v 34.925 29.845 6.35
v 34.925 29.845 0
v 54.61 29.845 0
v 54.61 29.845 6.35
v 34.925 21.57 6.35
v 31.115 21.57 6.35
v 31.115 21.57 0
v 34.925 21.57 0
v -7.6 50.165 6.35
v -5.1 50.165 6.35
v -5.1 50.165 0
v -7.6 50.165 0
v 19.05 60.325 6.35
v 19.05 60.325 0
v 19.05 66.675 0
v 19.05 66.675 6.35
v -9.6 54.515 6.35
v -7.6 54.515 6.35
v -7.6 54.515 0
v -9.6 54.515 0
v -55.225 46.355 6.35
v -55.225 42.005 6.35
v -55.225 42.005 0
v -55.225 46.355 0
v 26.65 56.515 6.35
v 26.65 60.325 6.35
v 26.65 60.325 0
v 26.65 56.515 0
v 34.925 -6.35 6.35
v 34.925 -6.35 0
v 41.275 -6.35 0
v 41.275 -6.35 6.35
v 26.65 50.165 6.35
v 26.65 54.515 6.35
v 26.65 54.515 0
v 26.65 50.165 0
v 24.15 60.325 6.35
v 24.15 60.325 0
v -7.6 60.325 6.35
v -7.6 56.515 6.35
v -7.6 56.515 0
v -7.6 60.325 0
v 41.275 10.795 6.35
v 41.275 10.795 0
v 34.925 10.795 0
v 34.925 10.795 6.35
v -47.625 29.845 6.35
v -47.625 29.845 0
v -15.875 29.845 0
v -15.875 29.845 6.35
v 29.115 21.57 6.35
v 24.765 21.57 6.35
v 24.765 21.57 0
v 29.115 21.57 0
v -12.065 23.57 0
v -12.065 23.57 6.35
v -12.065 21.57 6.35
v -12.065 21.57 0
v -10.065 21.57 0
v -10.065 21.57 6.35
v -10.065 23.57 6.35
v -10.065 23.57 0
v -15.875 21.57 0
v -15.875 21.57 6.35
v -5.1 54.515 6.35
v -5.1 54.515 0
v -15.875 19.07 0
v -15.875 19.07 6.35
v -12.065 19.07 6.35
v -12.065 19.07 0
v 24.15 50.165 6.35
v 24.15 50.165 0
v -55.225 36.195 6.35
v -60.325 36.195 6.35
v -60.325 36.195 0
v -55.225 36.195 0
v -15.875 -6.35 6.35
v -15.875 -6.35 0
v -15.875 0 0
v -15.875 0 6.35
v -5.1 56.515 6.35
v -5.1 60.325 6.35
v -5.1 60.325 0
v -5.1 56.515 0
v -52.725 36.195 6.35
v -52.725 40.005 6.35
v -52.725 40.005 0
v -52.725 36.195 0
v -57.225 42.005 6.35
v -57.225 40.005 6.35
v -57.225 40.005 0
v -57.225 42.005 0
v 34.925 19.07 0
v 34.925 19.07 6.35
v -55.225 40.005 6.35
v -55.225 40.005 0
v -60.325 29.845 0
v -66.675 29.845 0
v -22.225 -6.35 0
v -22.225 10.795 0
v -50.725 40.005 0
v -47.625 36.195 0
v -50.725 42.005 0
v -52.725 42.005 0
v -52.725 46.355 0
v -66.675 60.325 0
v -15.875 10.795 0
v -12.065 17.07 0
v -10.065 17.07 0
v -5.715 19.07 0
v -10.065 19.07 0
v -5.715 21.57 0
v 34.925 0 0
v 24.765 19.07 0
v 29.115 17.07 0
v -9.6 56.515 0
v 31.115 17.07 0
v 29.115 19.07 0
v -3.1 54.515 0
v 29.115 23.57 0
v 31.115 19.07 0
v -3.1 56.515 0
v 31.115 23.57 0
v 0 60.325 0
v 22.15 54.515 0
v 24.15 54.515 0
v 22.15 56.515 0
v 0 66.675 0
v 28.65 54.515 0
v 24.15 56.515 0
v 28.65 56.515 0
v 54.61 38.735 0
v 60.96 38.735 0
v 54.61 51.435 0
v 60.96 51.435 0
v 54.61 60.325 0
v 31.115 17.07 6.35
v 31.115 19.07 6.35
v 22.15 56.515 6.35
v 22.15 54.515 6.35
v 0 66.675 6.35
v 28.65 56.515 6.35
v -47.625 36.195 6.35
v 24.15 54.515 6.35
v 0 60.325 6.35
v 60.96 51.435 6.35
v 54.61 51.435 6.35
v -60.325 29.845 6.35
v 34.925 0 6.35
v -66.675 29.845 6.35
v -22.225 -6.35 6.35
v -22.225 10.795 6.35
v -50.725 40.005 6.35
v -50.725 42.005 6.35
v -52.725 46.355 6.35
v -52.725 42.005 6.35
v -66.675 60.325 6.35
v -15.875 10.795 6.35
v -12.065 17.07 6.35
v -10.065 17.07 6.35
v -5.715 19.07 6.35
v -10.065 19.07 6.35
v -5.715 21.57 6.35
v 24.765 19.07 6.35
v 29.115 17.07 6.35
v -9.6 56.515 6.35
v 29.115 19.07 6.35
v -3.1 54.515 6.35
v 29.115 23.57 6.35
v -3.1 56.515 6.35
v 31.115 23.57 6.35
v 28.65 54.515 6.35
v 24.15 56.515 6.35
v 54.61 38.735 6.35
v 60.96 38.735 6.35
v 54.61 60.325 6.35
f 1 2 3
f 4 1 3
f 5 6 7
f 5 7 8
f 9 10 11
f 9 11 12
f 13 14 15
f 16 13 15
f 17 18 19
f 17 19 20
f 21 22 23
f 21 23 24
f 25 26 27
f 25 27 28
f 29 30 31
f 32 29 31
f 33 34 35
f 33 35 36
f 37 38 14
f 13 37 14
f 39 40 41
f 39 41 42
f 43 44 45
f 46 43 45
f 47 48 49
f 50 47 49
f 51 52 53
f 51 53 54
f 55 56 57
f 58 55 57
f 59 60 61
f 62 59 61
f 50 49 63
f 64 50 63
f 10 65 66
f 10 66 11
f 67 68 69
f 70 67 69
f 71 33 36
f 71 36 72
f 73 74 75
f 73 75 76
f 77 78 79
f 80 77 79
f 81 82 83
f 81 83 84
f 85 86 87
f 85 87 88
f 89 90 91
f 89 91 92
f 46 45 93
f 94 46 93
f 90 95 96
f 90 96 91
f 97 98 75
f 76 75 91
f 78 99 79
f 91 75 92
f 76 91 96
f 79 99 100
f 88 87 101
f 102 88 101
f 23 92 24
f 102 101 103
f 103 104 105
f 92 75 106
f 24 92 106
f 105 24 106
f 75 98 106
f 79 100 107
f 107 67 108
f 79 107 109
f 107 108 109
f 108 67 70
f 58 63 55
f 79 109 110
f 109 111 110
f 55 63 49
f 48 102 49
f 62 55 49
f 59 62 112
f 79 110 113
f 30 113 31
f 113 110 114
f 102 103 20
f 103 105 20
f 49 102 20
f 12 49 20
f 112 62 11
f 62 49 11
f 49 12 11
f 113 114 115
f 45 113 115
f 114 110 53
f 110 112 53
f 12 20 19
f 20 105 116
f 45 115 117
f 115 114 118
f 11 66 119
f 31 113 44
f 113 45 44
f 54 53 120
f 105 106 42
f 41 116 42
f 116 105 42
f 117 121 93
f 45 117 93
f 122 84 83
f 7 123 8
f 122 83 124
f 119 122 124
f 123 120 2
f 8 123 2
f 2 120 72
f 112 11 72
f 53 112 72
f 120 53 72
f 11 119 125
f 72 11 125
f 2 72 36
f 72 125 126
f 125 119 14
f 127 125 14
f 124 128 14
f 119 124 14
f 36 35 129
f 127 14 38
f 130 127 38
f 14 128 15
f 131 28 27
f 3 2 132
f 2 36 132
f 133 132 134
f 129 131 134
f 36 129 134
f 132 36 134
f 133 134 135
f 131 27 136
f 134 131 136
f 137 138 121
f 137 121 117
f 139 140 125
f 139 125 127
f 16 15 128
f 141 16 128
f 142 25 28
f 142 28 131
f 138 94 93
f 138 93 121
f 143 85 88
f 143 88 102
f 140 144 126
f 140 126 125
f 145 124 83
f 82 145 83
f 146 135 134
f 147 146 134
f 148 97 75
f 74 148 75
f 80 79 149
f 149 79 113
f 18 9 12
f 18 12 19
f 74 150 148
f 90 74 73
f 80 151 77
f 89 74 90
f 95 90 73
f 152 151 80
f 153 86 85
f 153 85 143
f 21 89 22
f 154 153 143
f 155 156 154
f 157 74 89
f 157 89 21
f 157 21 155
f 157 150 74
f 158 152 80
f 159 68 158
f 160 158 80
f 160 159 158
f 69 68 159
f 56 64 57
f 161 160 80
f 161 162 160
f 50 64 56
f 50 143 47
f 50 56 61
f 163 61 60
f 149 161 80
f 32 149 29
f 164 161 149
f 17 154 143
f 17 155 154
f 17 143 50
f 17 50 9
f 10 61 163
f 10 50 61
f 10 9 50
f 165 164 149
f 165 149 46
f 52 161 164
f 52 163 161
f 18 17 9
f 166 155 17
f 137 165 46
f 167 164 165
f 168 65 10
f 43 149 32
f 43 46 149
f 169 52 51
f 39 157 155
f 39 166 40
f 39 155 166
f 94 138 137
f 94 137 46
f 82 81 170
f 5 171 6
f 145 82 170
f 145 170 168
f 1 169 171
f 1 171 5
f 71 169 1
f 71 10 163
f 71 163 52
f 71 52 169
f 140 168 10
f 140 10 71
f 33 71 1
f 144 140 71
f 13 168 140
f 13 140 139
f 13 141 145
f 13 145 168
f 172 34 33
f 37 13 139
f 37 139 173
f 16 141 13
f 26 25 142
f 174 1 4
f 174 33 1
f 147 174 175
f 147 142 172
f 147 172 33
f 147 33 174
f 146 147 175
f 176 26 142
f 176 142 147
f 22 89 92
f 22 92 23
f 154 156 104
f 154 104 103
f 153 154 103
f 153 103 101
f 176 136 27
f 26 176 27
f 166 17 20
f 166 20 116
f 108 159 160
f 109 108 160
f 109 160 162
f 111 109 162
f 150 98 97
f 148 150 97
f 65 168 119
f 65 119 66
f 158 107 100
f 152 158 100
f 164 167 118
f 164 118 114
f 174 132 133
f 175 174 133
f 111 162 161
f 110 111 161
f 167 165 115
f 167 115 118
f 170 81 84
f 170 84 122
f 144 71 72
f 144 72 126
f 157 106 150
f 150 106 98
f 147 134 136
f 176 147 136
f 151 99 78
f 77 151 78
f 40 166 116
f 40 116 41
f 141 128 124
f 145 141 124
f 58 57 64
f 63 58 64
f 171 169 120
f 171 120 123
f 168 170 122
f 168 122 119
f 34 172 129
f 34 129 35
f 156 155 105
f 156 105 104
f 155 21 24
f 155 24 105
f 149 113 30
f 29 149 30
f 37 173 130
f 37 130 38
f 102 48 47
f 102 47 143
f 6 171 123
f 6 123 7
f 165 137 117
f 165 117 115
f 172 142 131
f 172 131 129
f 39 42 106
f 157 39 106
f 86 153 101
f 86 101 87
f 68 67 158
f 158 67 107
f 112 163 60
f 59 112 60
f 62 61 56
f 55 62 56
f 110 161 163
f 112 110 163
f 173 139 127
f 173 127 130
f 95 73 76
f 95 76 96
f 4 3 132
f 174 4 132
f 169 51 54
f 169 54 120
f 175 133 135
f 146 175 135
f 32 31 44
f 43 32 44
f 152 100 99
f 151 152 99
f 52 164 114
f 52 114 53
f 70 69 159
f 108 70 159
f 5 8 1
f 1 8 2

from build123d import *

# Parameters (mm, degrees)
BOSS_EXTRUDE1_DEPTH = 6.35
SKETCH2_W           = 12.7
SKETCH2_H           = 6.35
CUT_EXTRUDE1_DEPTH  = 7.35
CUT_EXTRUDE2_DEPTH  = 7.35
CUT_EXTRUDE3_DEPTH  = 7.35


with BuildPart() as part:
    # Sketch1 → Boss-Extrude1 (new body)
    with BuildSketch(Plane.XY):
        Polygon((0, 0), (19.05, 0), (34.925, 0), (34.925, -6.35), (41.275, -6.35), (41.275, 0), (41.275, 10.795), (34.925, 10.795), (34.925, 29.845), (54.61, 29.845), (54.61, 38.735), (60.96, 38.735), (60.96, 51.435), (54.61, 51.435), (54.61, 60.325), (34.925, 60.325), (19.05, 60.325), (19.05, 66.675), (0, 66.675), (0, 60.325), (-15.875, 60.325), (-66.675, 60.325), (-66.675, 29.845), (-15.875, 29.845), (-15.875, 10.795), (-22.225, 10.795), (-22.225, 0), (-22.225, -6.35), (-15.875, -6.35), (-15.875, 0), align=None)
    extrude(amount=BOSS_EXTRUDE1_DEPTH)

    # Sketch2 → Cut-Extrude1 (cut, through all)
    with BuildSketch(Plane.XY.offset(6.35)):
        with Locations((-53.975, 33.02)):
            Rectangle(SKETCH2_W, SKETCH2_H)
    extrude(amount=-CUT_EXTRUDE1_DEPTH, mode=Mode.SUBTRACT)

    # Sketch3 → Cut-Extrude2 (cut, through all)
    with BuildSketch(Plane.XY.offset(6.35)):
        Polygon((-15.875, 21.57), (-15.875, 19.07), (-12.065, 19.07), (-12.065, 17.07), (-10.065, 17.07), (-10.065, 19.07), (-5.715, 19.07), (-5.715, 21.57), (-10.065, 21.57), (-10.065, 23.57), (-12.065, 23.57), (-12.065, 21.57), align=None)
        Polygon((34.925, 21.57), (34.925, 19.07), (31.115, 19.07), (31.115, 17.07), (29.115, 17.07), (29.115, 19.07), (24.765, 19.07), (24.765, 21.57), (29.115, 21.57), (29.115, 23.57), (31.115, 23.57), (31.115, 21.57), align=None)
    extrude(amount=-CUT_EXTRUDE2_DEPTH, mode=Mode.SUBTRACT)

    # Sketch5 → Cut-Extrude3 (cut, through all)
    with BuildSketch(Plane.XY.offset(6.35)):
        Polygon((-3.1, 56.515), (-3.1, 54.515), (-5.1, 54.515), (-5.1, 50.165), (-7.6, 50.165), (-7.6, 54.515), (-9.6, 54.515), (-9.6, 56.515), (-7.6, 56.515), (-7.6, 60.325), (-5.1, 60.325), (-5.1, 56.515), align=None)
        Polygon((-52.725, 42.005), (-50.725, 42.005), (-50.725, 40.005), (-52.725, 40.005), (-52.725, 36.195), (-55.225, 36.195), (-55.225, 40.005), (-57.225, 40.005), (-57.225, 42.005), (-55.225, 42.005), (-55.225, 46.355), (-52.725, 46.355), align=None)
        Polygon((26.65, 60.325), (26.65, 56.515), (28.65, 56.515), (28.65, 54.515), (26.65, 54.515), (26.65, 50.165), (24.15, 50.165), (24.15, 54.515), (22.15, 54.515), (22.15, 56.515), (24.15, 56.515), (24.15, 60.325), align=None)
    extrude(amount=-CUT_EXTRUDE3_DEPTH, mode=Mode.SUBTRACT)


solid = part.part
